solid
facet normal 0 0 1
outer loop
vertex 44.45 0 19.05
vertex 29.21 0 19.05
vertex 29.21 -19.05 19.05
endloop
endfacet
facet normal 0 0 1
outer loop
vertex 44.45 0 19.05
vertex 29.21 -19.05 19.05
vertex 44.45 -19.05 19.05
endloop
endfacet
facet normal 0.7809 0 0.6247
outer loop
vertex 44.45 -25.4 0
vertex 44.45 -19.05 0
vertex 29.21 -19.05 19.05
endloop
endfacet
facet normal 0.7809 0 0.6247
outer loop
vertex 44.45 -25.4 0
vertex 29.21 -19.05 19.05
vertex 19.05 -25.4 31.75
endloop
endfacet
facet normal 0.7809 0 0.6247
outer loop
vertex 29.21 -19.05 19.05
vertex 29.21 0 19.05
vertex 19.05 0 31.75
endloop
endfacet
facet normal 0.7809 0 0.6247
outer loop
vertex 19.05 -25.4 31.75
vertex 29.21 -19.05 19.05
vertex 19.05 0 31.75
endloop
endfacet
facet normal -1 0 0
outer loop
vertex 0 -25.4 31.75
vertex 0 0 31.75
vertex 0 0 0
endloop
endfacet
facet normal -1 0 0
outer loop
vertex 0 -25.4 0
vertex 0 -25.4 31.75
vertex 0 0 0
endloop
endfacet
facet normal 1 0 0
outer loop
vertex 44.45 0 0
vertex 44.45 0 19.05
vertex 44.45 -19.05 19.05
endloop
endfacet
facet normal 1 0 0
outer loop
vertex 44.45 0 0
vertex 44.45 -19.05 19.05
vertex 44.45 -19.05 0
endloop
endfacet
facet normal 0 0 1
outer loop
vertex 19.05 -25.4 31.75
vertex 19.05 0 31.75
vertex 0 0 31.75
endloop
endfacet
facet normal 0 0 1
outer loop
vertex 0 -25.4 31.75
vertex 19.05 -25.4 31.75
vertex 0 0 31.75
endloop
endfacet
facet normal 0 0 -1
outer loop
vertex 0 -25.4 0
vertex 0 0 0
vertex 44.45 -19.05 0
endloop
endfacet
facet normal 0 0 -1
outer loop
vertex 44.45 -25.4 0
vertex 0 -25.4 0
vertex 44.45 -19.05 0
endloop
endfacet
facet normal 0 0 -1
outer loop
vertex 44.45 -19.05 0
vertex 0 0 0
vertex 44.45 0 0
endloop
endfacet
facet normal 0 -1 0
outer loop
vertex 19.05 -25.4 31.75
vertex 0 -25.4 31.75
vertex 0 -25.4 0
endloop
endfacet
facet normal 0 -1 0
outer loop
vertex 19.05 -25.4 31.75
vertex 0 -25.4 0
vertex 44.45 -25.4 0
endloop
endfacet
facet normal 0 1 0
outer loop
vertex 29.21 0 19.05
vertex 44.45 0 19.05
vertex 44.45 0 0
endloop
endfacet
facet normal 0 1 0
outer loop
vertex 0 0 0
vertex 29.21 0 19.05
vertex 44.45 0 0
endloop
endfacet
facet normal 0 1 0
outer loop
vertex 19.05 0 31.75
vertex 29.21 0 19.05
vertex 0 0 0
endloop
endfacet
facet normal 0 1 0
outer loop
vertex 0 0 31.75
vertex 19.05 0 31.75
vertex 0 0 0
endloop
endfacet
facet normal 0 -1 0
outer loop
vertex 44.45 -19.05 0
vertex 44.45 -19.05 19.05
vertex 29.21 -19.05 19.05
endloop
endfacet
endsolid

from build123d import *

# Parameters (mm, degrees)
F1_DEPTH = 25.4
F5_DEPTH = 19.05


# Not quite as in the source:
# - a feature of the source that left no trace in its solid (it failed there, or was rolled back) is left out


with BuildPart() as f1:
    # F0 (on Front) → F1 (new body)
    with BuildSketch(Plane.XZ):
        Polygon((0, 31.75), (0, 0), (44.45, 0), (19.05, 31.75), align=None)
    extrude(amount=F1_DEPTH)

    # F4 (on face) → F5 (join)
    with BuildSketch(Plane(origin=(0, 0, 0), x_dir=(-1, 0, 0), z_dir=(0, 1, 0))):
        Polygon((-44.45, 19.05), (-44.45, 0), (-29.21, 19.05), align=None)
    extrude(amount=-F5_DEPTH)


solid = f1.part
